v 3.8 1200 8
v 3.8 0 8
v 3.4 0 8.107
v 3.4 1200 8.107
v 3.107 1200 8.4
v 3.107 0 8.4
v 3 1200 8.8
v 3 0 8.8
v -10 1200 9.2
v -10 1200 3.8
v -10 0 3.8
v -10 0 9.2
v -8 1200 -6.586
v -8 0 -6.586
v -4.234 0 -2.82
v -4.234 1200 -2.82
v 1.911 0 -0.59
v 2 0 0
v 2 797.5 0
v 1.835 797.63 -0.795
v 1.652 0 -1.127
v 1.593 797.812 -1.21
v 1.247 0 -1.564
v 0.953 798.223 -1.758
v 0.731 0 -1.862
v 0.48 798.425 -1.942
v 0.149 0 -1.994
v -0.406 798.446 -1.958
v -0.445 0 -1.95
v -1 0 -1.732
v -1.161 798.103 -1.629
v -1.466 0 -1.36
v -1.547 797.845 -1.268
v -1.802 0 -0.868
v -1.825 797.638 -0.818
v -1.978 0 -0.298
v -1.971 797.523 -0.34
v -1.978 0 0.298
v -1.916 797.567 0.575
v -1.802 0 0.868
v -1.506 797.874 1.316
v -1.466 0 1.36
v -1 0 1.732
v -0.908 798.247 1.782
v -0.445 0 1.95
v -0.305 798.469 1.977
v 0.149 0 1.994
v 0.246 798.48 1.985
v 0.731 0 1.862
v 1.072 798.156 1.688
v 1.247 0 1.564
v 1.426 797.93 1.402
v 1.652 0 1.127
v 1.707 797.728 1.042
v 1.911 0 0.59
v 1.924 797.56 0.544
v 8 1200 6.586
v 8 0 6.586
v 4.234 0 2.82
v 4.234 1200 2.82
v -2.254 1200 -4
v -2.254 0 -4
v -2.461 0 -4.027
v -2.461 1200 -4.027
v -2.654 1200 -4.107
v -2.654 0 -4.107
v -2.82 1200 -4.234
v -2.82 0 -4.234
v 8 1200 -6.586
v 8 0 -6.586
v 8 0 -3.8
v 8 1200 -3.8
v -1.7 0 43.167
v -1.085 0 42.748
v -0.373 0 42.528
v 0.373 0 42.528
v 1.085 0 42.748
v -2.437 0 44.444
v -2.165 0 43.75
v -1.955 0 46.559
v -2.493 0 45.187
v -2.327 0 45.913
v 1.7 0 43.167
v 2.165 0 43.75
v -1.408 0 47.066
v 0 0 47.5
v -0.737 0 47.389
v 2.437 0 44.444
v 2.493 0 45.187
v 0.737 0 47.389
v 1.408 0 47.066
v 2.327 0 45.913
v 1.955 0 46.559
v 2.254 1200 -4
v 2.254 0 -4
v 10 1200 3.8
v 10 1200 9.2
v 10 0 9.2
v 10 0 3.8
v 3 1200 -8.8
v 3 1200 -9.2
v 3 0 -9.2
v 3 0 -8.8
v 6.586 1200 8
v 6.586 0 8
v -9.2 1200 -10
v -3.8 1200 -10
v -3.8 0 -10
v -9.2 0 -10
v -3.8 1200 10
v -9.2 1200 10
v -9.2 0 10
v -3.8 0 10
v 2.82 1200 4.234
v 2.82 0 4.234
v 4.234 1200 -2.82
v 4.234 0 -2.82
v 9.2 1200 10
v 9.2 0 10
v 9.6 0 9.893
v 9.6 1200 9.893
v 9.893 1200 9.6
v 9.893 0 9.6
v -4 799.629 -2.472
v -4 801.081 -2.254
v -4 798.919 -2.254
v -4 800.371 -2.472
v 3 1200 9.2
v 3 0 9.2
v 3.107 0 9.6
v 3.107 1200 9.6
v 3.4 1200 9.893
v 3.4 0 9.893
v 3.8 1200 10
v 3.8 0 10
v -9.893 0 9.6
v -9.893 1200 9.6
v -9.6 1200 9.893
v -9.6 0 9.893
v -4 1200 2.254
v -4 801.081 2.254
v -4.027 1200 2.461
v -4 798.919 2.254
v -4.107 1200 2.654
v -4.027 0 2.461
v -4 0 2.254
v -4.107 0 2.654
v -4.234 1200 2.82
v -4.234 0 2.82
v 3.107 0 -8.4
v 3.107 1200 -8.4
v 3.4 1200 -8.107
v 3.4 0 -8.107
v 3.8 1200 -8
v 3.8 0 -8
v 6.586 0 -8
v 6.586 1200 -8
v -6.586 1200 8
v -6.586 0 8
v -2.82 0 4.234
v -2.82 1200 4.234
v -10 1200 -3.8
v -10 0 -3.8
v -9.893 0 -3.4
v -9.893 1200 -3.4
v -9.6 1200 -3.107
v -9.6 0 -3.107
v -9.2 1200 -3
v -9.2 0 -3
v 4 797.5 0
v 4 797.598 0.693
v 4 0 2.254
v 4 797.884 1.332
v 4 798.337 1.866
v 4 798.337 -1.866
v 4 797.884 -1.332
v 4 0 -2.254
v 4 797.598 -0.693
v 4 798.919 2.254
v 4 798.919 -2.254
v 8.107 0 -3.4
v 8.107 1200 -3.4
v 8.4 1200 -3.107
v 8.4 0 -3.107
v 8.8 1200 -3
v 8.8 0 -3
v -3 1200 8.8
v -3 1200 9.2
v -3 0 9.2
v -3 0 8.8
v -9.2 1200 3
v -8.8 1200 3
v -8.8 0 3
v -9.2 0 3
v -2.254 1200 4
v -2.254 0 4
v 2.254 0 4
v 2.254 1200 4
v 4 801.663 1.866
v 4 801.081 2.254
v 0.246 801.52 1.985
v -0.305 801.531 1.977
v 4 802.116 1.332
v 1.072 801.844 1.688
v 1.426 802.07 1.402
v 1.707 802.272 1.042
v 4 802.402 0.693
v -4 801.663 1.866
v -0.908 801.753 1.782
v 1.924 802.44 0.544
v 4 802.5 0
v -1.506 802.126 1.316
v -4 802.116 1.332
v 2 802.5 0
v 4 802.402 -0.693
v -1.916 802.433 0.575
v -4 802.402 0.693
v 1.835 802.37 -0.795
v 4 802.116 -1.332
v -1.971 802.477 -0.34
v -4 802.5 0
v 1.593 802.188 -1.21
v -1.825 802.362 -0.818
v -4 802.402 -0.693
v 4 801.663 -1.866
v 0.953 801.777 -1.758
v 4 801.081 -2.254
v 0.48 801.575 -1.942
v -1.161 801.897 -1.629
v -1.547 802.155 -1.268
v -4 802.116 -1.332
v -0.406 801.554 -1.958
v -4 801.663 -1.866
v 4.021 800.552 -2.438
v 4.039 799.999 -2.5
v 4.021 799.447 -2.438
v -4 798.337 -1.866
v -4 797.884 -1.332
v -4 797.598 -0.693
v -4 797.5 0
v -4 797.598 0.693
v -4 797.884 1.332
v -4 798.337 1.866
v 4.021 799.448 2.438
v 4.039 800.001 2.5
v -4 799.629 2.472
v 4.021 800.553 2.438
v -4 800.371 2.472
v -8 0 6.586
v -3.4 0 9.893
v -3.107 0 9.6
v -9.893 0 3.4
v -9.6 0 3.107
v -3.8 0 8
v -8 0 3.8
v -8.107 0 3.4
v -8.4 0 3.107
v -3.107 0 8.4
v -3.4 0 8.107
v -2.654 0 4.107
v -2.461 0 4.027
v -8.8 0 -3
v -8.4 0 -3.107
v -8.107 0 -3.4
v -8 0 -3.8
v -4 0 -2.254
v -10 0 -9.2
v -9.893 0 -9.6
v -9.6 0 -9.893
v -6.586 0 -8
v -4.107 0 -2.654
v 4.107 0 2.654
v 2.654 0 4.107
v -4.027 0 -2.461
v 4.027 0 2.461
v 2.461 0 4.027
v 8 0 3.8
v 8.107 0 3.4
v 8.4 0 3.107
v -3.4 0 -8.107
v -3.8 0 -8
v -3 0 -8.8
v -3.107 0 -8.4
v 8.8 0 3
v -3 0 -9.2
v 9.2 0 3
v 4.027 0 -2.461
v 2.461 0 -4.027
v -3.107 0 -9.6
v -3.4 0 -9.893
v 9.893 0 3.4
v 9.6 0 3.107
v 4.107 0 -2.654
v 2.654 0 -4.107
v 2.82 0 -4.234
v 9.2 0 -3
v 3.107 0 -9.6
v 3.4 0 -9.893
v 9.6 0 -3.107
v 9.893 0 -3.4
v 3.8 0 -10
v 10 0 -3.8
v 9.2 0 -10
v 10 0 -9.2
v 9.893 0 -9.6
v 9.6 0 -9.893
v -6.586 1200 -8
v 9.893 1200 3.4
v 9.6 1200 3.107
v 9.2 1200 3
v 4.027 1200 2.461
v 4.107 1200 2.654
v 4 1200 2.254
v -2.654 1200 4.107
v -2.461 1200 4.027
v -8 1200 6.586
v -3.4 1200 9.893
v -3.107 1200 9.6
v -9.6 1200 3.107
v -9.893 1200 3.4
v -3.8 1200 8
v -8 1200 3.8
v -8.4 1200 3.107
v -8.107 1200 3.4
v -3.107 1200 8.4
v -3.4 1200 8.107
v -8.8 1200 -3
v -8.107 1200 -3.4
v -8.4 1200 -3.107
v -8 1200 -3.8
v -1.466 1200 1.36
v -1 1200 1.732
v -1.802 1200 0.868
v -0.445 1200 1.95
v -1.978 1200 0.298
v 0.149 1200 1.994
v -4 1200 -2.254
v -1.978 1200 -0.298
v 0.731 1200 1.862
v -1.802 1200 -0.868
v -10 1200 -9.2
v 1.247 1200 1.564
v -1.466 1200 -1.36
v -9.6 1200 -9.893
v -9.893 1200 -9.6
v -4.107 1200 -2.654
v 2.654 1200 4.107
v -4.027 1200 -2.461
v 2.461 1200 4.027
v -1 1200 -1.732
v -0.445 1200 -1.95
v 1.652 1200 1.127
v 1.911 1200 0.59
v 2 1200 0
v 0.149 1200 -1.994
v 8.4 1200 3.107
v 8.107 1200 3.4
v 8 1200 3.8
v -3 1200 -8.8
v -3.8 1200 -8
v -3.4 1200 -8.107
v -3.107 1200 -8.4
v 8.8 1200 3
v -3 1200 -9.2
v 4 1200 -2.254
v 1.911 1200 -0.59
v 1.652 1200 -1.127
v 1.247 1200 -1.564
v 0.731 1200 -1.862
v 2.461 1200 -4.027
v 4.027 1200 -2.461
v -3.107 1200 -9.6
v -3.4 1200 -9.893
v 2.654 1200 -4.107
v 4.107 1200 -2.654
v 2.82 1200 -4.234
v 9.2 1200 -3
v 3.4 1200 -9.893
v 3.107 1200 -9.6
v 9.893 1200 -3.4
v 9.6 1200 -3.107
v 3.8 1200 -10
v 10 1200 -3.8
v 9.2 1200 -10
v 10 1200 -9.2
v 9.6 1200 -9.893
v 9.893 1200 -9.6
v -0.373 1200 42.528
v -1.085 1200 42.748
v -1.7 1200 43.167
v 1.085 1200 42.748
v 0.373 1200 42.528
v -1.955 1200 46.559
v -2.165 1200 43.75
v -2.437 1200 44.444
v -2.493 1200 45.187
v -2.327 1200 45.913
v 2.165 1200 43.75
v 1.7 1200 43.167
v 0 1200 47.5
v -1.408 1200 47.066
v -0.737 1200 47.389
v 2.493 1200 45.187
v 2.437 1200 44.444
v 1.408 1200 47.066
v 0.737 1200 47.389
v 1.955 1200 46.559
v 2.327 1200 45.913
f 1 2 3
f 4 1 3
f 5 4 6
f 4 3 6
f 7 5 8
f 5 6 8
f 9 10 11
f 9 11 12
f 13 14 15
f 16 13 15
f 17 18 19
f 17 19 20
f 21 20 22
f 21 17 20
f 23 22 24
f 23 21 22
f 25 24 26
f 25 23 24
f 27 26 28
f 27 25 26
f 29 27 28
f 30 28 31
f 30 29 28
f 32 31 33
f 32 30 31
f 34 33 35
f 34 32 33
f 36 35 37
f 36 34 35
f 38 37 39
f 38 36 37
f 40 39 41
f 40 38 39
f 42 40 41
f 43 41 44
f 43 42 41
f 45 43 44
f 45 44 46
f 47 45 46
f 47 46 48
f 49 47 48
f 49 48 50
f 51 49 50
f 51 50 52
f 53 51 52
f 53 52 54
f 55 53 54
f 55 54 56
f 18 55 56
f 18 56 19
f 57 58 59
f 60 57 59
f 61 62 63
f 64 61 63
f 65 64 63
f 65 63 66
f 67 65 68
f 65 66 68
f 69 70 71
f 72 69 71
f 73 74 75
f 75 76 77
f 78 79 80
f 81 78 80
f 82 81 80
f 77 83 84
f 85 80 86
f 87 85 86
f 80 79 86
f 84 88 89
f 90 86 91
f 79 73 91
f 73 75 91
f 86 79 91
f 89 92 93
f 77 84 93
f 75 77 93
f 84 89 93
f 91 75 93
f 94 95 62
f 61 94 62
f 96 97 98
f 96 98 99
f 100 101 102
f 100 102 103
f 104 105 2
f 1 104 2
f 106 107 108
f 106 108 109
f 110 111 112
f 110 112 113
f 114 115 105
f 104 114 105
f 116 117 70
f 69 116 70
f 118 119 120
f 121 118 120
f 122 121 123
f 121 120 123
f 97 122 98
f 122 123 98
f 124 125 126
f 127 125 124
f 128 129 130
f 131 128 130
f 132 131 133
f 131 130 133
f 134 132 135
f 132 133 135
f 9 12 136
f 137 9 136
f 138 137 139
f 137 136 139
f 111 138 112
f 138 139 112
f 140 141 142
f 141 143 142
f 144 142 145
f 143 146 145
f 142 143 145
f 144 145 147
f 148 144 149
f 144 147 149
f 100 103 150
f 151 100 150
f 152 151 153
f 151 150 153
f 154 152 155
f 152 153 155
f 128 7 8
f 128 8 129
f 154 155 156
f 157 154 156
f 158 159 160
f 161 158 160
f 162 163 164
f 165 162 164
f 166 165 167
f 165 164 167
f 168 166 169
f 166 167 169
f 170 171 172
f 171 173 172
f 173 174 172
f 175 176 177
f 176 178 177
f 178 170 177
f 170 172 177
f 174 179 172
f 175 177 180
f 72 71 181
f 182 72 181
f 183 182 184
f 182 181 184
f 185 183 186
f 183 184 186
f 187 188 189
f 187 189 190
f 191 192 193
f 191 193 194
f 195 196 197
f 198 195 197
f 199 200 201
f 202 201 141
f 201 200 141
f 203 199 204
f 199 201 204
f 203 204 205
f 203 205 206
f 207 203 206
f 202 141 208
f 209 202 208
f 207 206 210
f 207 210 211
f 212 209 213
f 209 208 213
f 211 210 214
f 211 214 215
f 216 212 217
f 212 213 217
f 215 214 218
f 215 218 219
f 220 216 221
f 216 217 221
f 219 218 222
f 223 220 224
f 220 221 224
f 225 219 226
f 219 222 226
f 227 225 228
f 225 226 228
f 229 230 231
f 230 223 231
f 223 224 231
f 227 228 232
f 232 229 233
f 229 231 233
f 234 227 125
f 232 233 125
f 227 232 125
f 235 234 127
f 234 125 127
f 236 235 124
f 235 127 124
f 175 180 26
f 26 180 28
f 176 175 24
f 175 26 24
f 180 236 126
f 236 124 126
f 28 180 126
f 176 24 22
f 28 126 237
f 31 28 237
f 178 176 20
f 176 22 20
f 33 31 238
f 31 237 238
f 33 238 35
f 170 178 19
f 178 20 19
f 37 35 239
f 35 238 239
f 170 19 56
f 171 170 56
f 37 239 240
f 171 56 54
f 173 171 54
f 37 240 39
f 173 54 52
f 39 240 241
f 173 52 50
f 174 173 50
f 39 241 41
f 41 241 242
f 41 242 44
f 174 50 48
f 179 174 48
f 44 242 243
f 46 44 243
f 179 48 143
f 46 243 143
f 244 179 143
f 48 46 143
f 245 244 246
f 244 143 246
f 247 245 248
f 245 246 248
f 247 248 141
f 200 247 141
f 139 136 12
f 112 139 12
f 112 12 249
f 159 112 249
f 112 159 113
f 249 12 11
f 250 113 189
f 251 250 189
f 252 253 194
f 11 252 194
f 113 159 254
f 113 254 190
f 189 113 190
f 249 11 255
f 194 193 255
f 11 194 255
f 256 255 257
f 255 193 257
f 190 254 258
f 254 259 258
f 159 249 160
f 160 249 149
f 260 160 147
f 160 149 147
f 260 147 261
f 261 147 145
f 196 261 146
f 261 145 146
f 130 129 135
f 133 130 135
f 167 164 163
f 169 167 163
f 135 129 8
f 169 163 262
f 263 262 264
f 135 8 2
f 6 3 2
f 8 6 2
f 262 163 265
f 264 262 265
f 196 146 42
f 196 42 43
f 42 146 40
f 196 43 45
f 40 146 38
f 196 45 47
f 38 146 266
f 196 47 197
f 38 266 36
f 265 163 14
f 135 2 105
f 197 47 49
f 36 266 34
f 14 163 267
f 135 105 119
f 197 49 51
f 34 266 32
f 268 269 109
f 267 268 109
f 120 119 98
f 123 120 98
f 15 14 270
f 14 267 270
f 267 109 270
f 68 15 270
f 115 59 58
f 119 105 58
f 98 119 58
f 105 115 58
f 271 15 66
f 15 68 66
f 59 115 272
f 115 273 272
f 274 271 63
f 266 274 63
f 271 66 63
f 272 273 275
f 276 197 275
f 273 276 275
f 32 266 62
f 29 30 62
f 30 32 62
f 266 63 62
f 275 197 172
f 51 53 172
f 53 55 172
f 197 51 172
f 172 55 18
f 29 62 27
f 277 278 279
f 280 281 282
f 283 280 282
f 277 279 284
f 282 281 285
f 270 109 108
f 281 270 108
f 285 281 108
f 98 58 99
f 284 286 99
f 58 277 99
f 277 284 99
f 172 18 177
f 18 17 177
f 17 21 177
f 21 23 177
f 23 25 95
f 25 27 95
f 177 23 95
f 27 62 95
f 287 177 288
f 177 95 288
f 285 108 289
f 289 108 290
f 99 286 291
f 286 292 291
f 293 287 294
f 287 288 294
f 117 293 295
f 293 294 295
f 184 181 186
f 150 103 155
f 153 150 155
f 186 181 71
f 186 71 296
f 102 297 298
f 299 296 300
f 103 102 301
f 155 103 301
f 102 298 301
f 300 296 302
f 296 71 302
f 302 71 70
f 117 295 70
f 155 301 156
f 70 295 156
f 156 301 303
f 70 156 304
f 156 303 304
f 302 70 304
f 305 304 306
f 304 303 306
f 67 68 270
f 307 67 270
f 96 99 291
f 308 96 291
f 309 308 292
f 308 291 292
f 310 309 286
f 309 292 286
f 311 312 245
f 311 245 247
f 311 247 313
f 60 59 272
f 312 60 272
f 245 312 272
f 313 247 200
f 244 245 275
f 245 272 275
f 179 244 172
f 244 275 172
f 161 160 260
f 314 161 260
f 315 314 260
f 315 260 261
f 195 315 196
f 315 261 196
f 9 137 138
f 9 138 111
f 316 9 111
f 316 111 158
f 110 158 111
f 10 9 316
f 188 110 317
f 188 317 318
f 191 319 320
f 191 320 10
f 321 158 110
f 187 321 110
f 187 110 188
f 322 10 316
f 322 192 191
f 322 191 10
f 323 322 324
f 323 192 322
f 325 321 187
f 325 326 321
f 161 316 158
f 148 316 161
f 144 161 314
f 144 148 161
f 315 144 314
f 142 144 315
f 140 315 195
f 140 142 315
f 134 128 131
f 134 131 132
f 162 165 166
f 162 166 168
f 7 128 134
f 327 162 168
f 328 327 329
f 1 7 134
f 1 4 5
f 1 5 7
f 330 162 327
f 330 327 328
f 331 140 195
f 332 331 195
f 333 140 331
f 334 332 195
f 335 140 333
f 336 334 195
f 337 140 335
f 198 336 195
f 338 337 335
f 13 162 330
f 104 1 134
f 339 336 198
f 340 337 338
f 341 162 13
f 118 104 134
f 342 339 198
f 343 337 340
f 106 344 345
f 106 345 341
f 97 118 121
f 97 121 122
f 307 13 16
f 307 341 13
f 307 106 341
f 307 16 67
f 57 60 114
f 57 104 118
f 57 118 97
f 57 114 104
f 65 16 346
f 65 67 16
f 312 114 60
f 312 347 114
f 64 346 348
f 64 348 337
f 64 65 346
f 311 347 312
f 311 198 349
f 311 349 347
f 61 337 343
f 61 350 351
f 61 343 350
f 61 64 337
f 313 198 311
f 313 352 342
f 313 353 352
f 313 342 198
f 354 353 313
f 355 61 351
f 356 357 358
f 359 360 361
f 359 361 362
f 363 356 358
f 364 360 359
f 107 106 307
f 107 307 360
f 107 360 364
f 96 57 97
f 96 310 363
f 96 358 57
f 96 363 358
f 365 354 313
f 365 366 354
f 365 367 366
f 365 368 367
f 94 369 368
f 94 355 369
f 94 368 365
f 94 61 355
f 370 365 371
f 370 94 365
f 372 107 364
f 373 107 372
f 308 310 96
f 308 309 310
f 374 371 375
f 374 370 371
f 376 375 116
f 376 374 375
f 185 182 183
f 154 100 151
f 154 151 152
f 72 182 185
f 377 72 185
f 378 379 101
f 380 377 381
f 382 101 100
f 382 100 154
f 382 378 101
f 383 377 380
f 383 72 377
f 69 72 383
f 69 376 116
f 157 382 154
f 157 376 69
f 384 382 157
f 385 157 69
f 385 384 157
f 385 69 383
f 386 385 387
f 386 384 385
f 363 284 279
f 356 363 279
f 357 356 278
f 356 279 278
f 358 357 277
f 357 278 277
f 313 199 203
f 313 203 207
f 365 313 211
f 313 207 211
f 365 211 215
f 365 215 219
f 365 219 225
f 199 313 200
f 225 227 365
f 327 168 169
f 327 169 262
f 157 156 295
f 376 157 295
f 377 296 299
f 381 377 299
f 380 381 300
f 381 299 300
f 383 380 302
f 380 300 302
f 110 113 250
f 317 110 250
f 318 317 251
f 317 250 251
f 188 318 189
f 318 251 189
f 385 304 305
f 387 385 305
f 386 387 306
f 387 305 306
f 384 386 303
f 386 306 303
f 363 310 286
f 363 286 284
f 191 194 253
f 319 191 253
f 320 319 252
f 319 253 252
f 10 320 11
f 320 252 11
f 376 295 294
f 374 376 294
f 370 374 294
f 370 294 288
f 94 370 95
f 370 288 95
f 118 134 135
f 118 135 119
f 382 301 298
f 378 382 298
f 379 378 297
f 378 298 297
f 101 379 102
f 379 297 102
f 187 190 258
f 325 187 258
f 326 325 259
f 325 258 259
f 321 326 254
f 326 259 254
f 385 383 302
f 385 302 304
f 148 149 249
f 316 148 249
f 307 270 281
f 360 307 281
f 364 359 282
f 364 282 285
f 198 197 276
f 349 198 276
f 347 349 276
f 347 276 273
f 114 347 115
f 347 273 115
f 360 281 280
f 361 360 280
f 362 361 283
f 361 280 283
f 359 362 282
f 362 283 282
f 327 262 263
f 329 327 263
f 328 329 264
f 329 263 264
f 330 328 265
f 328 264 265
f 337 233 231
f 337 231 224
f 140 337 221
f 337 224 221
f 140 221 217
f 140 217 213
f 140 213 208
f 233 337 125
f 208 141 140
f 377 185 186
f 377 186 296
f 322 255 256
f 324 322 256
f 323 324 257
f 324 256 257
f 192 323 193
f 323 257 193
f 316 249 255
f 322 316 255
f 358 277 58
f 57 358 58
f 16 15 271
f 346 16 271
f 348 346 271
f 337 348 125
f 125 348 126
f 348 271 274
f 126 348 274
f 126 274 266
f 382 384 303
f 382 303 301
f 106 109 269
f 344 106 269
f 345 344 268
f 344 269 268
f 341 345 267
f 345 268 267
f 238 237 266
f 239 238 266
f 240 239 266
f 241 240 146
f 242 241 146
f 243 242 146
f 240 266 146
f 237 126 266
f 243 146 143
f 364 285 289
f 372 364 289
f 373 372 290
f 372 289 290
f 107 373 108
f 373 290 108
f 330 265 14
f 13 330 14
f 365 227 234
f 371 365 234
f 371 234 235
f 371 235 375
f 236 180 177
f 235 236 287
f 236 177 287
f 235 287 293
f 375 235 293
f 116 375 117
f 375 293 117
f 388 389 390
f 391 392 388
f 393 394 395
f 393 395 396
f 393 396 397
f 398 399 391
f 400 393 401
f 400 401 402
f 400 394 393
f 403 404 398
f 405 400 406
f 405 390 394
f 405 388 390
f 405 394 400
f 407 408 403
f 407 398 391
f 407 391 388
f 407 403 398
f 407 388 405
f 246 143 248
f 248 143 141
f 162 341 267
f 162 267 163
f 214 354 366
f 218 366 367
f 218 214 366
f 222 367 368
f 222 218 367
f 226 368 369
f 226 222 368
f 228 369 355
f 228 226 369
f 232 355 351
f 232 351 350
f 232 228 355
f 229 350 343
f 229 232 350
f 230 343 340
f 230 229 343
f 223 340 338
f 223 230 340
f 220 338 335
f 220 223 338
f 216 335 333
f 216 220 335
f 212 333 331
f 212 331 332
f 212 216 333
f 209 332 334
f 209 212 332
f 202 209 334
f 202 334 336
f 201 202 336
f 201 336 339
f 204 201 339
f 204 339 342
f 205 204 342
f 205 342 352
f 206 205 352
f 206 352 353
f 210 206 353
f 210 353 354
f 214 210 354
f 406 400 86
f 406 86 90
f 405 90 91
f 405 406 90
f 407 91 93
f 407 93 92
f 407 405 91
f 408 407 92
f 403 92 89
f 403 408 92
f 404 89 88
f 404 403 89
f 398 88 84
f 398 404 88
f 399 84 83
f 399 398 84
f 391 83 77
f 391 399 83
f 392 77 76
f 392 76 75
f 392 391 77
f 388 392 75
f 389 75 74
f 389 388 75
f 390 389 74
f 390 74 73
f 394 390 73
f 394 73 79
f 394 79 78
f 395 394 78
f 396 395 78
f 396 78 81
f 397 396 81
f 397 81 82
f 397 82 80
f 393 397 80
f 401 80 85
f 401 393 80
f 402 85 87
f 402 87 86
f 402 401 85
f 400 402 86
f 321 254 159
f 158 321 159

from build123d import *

# Parameters (mm, degrees)
ALUMINIUM_PROFILE_SIZES_4X4_1_OUTLINE_R = 2
ALUMINIUM_PROFILE_SIZES_4X4_1_DEPTH     = 1200
SKETCH12_R                              = 2.5
BOSS_EXTRUDE1_DEPTH                     = 1200
SKETCH13_R                              = 2.5
CUT_EXTRUDE1_DEPTH                      = 1202.021336197


# Read off the part's stored shape, not the designer's step: Aluminium profile sizes 4X4(1)
with BuildPart() as part:
    # Aluminium profile sizes 4X4(1) outline → Aluminium profile sizes 4X4(1) (new body)
    with BuildSketch(Plane(origin=(0, 0, 0), x_dir=(1, 0, 0), z_dir=(0, 1, 0))):
        with BuildLine():
            Line((4, -2.254415588), (4, 2.254415588))
            ThreePointArc((4, 2.254415588), (4.060896374, 2.560562334), (4.234314575, 2.820101013))
            Line((4.234314575, 2.820101013), (8, 6.585786438))
            Line((8, 6.585786438), (8, 3.8))
            ThreePointArc((8, 3.8), (8.234314575, 3.234314575), (8.8, 3))
            Line((8.8, 3), (9.2, 3))
            ThreePointArc((9.2, 3), (9.765685425, 3.234314575), (10, 3.8))
            Line((10, 3.8), (10, 9.2))
            ThreePointArc((10, 9.2), (9.765685425, 9.765685425), (9.2, 10))
            Line((9.2, 10), (3.8, 10))
            ThreePointArc((3.8, 10), (3.234314575, 9.765685425), (3, 9.2))
            Line((3, 9.2), (3, 8.8))
            ThreePointArc((3, 8.8), (3.234314575, 8.234314575), (3.8, 8))
            Line((3.8, 8), (6.585786438, 8))
            Line((6.585786438, 8), (2.820101013, 4.234314575))
            ThreePointArc((2.820101013, 4.234314575), (2.560562334, 4.060896374), (2.254415588, 4))
            Line((2.254415588, 4), (-2.254415588, 4))
            ThreePointArc((-2.254415588, 4), (-2.560562334, 4.060896374), (-2.820101013, 4.234314575))
            Line((-2.820101013, 4.234314575), (-6.585786438, 8))
            Line((-6.585786438, 8), (-3.8, 8))
            ThreePointArc((-3.8, 8), (-3.234314575, 8.234314575), (-3, 8.8))
            Line((-3, 8.8), (-3, 9.2))
            ThreePointArc((-3, 9.2), (-3.234314575, 9.765685425), (-3.8, 10))
            Line((-3.8, 10), (-9.2, 10))
            ThreePointArc((-9.2, 10), (-9.765685425, 9.765685425), (-10, 9.2))
            Line((-10, 9.2), (-10, 3.8))
            ThreePointArc((-10, 3.8), (-9.765685425, 3.234314575), (-9.2, 3))
            Line((-9.2, 3), (-8.8, 3))
            ThreePointArc((-8.8, 3), (-8.234314575, 3.234314575), (-8, 3.8))
            Line((-8, 3.8), (-8, 6.585786438))
            Line((-8, 6.585786438), (-4.234314575, 2.820101013))
            ThreePointArc((-4.234314575, 2.820101013), (-4.060896374, 2.560562334), (-4, 2.254415588))
            Line((-4, 2.254415588), (-4, -2.254415588))
            ThreePointArc((-4, -2.254415588), (-4.060896374, -2.560562334), (-4.234314575, -2.820101013))
            Line((-4.234314575, -2.820101013), (-8, -6.585786438))
            Line((-8, -6.585786438), (-8, -3.8))
            ThreePointArc((-8, -3.8), (-8.234314575, -3.234314575), (-8.8, -3))
            Line((-8.8, -3), (-9.2, -3))
            ThreePointArc((-9.2, -3), (-9.765685425, -3.234314575), (-10, -3.8))
            Line((-10, -3.8), (-10, -9.2))
            ThreePointArc((-10, -9.2), (-9.765685425, -9.765685425), (-9.2, -10))
            Line((-9.2, -10), (-3.8, -10))
            ThreePointArc((-3.8, -10), (-3.234314575, -9.765685425), (-3, -9.2))
            Line((-3, -9.2), (-3, -8.8))
            ThreePointArc((-3, -8.8), (-3.234314575, -8.234314575), (-3.8, -8))
            Line((-3.8, -8), (-6.585786438, -8))
            Line((-6.585786438, -8), (-2.820101013, -4.234314575))
            ThreePointArc((-2.820101013, -4.234314575), (-2.560562334, -4.060896374), (-2.254415588, -4))
            Line((-2.254415588, -4), (2.254415588, -4))
            ThreePointArc((2.254415588, -4), (2.560562334, -4.060896374), (2.820101013, -4.234314575))
            Line((2.820101013, -4.234314575), (6.585786438, -8))
            Line((6.585786438, -8), (3.8, -8))
            ThreePointArc((3.8, -8), (3.234314575, -8.234314575), (3, -8.8))
            Line((3, -8.8), (3, -9.2))
            ThreePointArc((3, -9.2), (3.234314575, -9.765685425), (3.8, -10))
            Line((3.8, -10), (9.2, -10))
            ThreePointArc((9.2, -10), (9.765685425, -9.765685425), (10, -9.2))
            Line((10, -9.2), (10, -3.8))
            ThreePointArc((10, -3.8), (9.765685425, -3.234314575), (9.2, -3))
            Line((9.2, -3), (8.8, -3))
            ThreePointArc((8.8, -3), (8.234314575, -3.234314575), (8, -3.8))
            Line((8, -3.8), (8, -6.585786438))
            Line((8, -6.585786438), (4.234314575, -2.820101013))
            ThreePointArc((4.234314575, -2.820101013), (4.060896374, -2.560562334), (4, -2.254415588))
        make_face()
        Circle(ALUMINIUM_PROFILE_SIZES_4X4_1_OUTLINE_R, mode=Mode.SUBTRACT)
    extrude(amount=ALUMINIUM_PROFILE_SIZES_4X4_1_DEPTH)

    # Sketch13 → Cut-Extrude1 (cut, through all)
    with BuildSketch(Plane.ZY.offset(4)):
        with Locations(Location((0, 800, 0), (0, 0, 25.608789007))):
            Circle(SKETCH13_R)
    extrude(amount=-CUT_EXTRUDE1_DEPTH, mode=Mode.SUBTRACT)


with BuildPart() as body_2:
    # Sketch12 → Boss-Extrude1 (new body)
    with BuildSketch(Plane(origin=(0, 1200, 0), x_dir=(1, 0, 0), z_dir=(0, 1, 0))):
        with Locations(Location((0, -45, 0), (0, 0, 270))):
            Circle(SKETCH12_R)
    extrude(amount=-BOSS_EXTRUDE1_DEPTH)


solid = Compound([part.part, body_2.part])
